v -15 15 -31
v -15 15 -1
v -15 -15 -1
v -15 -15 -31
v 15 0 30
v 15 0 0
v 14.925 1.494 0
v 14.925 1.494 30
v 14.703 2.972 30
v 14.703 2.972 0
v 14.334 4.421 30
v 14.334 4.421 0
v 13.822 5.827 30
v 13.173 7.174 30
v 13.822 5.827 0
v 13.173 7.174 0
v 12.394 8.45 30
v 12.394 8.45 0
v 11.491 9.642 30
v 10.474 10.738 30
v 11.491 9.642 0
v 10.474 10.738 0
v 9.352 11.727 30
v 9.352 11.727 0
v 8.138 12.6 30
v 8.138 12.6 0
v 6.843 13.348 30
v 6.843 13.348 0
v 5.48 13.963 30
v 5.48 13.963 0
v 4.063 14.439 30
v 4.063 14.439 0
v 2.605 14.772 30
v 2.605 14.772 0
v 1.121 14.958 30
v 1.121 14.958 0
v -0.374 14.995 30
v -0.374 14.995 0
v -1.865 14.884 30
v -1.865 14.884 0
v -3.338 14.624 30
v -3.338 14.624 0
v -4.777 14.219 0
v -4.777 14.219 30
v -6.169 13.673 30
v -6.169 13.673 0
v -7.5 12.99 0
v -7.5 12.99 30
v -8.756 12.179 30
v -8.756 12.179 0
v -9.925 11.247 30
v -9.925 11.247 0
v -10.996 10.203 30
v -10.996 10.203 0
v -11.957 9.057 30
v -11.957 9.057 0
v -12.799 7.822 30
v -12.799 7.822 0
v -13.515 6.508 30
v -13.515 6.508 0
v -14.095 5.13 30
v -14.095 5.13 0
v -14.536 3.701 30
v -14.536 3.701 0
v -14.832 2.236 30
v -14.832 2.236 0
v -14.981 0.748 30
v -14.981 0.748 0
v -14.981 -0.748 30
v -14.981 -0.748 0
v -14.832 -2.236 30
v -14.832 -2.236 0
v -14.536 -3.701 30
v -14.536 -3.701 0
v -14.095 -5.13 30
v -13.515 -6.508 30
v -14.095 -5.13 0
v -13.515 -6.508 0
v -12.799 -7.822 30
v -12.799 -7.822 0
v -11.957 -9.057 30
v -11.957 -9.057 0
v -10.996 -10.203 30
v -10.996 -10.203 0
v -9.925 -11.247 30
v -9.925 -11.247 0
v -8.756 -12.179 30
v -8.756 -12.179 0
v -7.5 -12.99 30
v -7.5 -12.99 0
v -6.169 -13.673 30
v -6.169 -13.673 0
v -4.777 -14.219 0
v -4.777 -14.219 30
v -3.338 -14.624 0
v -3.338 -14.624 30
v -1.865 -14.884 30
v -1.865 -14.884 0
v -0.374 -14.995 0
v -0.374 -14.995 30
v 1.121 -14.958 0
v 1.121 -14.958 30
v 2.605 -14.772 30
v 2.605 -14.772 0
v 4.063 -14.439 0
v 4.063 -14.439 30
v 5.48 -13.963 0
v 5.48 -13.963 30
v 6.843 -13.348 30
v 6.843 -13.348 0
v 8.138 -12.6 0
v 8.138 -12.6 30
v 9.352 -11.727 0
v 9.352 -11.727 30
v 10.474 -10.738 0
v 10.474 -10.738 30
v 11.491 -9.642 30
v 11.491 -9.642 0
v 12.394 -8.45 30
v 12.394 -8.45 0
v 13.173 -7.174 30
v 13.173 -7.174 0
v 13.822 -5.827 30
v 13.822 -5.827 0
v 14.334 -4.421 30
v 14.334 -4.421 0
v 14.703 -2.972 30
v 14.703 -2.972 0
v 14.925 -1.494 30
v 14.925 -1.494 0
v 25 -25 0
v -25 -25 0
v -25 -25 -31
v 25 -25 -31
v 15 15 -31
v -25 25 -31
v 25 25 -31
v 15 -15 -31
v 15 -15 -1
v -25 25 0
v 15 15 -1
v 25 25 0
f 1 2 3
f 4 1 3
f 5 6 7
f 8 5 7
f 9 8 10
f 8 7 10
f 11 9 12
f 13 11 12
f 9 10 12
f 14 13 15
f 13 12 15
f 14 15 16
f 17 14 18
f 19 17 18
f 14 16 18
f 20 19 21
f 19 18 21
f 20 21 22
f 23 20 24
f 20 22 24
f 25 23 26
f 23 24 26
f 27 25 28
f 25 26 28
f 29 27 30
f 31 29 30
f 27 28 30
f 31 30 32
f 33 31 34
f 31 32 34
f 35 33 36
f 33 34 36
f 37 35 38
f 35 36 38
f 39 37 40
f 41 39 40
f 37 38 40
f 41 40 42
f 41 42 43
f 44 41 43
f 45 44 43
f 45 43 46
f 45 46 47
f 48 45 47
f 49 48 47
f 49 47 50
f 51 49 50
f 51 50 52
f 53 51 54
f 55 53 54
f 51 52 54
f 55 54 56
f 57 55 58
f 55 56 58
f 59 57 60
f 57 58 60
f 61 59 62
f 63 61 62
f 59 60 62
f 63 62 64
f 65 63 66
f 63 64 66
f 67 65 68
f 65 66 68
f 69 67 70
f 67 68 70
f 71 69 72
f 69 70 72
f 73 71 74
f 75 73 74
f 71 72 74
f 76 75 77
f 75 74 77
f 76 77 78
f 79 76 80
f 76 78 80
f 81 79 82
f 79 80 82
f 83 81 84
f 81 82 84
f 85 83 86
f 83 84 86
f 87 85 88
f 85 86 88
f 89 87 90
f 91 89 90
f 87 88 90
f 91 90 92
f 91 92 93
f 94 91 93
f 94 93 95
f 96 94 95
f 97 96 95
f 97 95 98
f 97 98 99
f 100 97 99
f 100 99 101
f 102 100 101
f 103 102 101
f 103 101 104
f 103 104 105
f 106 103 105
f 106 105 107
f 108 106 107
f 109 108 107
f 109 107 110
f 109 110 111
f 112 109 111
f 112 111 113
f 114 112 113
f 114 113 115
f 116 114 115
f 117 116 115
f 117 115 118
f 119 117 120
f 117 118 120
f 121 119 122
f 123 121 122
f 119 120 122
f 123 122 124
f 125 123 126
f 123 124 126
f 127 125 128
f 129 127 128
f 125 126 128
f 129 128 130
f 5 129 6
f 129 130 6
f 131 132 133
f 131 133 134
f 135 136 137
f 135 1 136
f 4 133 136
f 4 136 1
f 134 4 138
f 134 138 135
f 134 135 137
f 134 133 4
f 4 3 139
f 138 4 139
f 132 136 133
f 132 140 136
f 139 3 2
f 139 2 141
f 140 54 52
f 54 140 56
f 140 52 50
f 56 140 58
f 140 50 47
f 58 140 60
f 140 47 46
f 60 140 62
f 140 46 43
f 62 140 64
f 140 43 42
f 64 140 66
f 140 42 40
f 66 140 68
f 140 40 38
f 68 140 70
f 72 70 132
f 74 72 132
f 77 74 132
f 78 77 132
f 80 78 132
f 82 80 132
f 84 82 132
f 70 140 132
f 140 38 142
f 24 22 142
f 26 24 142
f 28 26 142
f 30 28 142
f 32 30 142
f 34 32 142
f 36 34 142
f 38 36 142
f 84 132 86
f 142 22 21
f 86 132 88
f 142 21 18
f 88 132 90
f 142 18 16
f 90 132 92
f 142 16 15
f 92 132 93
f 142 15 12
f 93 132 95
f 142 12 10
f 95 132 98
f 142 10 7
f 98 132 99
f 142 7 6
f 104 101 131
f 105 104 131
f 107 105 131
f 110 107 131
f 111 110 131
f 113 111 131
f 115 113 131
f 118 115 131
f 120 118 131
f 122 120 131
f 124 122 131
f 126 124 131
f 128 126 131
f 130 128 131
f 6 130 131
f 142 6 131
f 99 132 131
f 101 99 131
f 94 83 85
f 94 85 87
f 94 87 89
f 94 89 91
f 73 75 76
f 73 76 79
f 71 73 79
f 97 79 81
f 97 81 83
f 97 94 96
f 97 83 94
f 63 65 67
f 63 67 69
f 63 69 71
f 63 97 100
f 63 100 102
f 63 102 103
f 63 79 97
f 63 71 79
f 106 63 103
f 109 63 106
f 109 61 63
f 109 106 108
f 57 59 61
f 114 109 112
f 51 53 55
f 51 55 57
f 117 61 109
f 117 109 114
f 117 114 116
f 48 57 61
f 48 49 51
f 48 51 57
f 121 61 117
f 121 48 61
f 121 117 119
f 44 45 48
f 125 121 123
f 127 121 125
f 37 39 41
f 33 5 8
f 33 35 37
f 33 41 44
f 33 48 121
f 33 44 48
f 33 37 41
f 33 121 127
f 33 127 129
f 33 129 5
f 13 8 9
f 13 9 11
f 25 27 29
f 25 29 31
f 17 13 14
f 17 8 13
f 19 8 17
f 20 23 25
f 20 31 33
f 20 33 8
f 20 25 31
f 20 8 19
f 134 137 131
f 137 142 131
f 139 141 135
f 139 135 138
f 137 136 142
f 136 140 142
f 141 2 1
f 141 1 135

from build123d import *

# Parameters (mm, degrees)
F0_R     = 15
F1_DEPTH = 30
F2_W     = 50
F2_H     = 50
F3_DEPTH = 1
F4_W     = 50
F4_H     = 50
F4_W_2   = 30
F4_H_2   = 30
F5_DEPTH = 30


with BuildPart() as f1:
    # F0 (on Top) → F1 (new body)
    with BuildSketch(Plane.XY):
        Circle(F0_R)
    extrude(amount=F1_DEPTH)

    # F2 (on face) → F3 (join)
    with BuildSketch(Plane(origin=(0, 0, 0), x_dir=(1, 0, 0), z_dir=(0, 0, -1))):
        Rectangle(F2_W, F2_H)
        Polygon((15, 0), (15, -15), (0, -15), (-15, -15), (-15, 3.9e-09), (-15, 15), (0, 15), (15, 15), align=None, mode=Mode.SUBTRACT)
        with BuildLine():
            Line((0, -15), (15, -15))
            Line((15, -15), (15, 0))
            ThreePointArc((15, 0), (10.6066017178, -10.6066017178), (0, -15))
        make_face()
        with BuildLine():
            Line((-15, -15), (0, -15))
            ThreePointArc((0, -15), (-10.6066017192, -10.6066017164), (-15, 3.9e-09))
            Line((-15, 3.9e-09), (-15, -15))
        make_face()
        with BuildLine():
            ThreePointArc((-15, 3.9e-09), (-10.6066017192, -10.6066017164), (0, -15))
            ThreePointArc((0, -15), (10.6066017178, -10.6066017178), (15, 0))
            ThreePointArc((15, 0), (10.6066017178, 10.6066017178), (0, 15))
            ThreePointArc((0, 15), (-10.6066017164, 10.6066017192), (-15, 3.9e-09))
        make_face()
        with BuildLine():
            ThreePointArc((0, 15), (10.6066017178, 10.6066017178), (15, 0))
            Line((15, 0), (15, 15))
            Line((15, 15), (0, 15))
        make_face()
        with BuildLine():
            Line((-15, 15), (-15, 3.9e-09))
            ThreePointArc((-15, 3.9e-09), (-10.6066017164, 10.6066017192), (0, 15))
            Line((0, 15), (-15, 15))
        make_face()
    extrude(amount=F3_DEPTH)

    # F4 (on face) → F5 (join)
    with BuildSketch(Plane(origin=(0, 0, -1), x_dir=(1, 0, 0), z_dir=(0, 0, -1))):
        Rectangle(F4_W, F4_H)
        Rectangle(F4_W_2, F4_H_2, mode=Mode.SUBTRACT)
    extrude(amount=F5_DEPTH)


solid = f1.part
